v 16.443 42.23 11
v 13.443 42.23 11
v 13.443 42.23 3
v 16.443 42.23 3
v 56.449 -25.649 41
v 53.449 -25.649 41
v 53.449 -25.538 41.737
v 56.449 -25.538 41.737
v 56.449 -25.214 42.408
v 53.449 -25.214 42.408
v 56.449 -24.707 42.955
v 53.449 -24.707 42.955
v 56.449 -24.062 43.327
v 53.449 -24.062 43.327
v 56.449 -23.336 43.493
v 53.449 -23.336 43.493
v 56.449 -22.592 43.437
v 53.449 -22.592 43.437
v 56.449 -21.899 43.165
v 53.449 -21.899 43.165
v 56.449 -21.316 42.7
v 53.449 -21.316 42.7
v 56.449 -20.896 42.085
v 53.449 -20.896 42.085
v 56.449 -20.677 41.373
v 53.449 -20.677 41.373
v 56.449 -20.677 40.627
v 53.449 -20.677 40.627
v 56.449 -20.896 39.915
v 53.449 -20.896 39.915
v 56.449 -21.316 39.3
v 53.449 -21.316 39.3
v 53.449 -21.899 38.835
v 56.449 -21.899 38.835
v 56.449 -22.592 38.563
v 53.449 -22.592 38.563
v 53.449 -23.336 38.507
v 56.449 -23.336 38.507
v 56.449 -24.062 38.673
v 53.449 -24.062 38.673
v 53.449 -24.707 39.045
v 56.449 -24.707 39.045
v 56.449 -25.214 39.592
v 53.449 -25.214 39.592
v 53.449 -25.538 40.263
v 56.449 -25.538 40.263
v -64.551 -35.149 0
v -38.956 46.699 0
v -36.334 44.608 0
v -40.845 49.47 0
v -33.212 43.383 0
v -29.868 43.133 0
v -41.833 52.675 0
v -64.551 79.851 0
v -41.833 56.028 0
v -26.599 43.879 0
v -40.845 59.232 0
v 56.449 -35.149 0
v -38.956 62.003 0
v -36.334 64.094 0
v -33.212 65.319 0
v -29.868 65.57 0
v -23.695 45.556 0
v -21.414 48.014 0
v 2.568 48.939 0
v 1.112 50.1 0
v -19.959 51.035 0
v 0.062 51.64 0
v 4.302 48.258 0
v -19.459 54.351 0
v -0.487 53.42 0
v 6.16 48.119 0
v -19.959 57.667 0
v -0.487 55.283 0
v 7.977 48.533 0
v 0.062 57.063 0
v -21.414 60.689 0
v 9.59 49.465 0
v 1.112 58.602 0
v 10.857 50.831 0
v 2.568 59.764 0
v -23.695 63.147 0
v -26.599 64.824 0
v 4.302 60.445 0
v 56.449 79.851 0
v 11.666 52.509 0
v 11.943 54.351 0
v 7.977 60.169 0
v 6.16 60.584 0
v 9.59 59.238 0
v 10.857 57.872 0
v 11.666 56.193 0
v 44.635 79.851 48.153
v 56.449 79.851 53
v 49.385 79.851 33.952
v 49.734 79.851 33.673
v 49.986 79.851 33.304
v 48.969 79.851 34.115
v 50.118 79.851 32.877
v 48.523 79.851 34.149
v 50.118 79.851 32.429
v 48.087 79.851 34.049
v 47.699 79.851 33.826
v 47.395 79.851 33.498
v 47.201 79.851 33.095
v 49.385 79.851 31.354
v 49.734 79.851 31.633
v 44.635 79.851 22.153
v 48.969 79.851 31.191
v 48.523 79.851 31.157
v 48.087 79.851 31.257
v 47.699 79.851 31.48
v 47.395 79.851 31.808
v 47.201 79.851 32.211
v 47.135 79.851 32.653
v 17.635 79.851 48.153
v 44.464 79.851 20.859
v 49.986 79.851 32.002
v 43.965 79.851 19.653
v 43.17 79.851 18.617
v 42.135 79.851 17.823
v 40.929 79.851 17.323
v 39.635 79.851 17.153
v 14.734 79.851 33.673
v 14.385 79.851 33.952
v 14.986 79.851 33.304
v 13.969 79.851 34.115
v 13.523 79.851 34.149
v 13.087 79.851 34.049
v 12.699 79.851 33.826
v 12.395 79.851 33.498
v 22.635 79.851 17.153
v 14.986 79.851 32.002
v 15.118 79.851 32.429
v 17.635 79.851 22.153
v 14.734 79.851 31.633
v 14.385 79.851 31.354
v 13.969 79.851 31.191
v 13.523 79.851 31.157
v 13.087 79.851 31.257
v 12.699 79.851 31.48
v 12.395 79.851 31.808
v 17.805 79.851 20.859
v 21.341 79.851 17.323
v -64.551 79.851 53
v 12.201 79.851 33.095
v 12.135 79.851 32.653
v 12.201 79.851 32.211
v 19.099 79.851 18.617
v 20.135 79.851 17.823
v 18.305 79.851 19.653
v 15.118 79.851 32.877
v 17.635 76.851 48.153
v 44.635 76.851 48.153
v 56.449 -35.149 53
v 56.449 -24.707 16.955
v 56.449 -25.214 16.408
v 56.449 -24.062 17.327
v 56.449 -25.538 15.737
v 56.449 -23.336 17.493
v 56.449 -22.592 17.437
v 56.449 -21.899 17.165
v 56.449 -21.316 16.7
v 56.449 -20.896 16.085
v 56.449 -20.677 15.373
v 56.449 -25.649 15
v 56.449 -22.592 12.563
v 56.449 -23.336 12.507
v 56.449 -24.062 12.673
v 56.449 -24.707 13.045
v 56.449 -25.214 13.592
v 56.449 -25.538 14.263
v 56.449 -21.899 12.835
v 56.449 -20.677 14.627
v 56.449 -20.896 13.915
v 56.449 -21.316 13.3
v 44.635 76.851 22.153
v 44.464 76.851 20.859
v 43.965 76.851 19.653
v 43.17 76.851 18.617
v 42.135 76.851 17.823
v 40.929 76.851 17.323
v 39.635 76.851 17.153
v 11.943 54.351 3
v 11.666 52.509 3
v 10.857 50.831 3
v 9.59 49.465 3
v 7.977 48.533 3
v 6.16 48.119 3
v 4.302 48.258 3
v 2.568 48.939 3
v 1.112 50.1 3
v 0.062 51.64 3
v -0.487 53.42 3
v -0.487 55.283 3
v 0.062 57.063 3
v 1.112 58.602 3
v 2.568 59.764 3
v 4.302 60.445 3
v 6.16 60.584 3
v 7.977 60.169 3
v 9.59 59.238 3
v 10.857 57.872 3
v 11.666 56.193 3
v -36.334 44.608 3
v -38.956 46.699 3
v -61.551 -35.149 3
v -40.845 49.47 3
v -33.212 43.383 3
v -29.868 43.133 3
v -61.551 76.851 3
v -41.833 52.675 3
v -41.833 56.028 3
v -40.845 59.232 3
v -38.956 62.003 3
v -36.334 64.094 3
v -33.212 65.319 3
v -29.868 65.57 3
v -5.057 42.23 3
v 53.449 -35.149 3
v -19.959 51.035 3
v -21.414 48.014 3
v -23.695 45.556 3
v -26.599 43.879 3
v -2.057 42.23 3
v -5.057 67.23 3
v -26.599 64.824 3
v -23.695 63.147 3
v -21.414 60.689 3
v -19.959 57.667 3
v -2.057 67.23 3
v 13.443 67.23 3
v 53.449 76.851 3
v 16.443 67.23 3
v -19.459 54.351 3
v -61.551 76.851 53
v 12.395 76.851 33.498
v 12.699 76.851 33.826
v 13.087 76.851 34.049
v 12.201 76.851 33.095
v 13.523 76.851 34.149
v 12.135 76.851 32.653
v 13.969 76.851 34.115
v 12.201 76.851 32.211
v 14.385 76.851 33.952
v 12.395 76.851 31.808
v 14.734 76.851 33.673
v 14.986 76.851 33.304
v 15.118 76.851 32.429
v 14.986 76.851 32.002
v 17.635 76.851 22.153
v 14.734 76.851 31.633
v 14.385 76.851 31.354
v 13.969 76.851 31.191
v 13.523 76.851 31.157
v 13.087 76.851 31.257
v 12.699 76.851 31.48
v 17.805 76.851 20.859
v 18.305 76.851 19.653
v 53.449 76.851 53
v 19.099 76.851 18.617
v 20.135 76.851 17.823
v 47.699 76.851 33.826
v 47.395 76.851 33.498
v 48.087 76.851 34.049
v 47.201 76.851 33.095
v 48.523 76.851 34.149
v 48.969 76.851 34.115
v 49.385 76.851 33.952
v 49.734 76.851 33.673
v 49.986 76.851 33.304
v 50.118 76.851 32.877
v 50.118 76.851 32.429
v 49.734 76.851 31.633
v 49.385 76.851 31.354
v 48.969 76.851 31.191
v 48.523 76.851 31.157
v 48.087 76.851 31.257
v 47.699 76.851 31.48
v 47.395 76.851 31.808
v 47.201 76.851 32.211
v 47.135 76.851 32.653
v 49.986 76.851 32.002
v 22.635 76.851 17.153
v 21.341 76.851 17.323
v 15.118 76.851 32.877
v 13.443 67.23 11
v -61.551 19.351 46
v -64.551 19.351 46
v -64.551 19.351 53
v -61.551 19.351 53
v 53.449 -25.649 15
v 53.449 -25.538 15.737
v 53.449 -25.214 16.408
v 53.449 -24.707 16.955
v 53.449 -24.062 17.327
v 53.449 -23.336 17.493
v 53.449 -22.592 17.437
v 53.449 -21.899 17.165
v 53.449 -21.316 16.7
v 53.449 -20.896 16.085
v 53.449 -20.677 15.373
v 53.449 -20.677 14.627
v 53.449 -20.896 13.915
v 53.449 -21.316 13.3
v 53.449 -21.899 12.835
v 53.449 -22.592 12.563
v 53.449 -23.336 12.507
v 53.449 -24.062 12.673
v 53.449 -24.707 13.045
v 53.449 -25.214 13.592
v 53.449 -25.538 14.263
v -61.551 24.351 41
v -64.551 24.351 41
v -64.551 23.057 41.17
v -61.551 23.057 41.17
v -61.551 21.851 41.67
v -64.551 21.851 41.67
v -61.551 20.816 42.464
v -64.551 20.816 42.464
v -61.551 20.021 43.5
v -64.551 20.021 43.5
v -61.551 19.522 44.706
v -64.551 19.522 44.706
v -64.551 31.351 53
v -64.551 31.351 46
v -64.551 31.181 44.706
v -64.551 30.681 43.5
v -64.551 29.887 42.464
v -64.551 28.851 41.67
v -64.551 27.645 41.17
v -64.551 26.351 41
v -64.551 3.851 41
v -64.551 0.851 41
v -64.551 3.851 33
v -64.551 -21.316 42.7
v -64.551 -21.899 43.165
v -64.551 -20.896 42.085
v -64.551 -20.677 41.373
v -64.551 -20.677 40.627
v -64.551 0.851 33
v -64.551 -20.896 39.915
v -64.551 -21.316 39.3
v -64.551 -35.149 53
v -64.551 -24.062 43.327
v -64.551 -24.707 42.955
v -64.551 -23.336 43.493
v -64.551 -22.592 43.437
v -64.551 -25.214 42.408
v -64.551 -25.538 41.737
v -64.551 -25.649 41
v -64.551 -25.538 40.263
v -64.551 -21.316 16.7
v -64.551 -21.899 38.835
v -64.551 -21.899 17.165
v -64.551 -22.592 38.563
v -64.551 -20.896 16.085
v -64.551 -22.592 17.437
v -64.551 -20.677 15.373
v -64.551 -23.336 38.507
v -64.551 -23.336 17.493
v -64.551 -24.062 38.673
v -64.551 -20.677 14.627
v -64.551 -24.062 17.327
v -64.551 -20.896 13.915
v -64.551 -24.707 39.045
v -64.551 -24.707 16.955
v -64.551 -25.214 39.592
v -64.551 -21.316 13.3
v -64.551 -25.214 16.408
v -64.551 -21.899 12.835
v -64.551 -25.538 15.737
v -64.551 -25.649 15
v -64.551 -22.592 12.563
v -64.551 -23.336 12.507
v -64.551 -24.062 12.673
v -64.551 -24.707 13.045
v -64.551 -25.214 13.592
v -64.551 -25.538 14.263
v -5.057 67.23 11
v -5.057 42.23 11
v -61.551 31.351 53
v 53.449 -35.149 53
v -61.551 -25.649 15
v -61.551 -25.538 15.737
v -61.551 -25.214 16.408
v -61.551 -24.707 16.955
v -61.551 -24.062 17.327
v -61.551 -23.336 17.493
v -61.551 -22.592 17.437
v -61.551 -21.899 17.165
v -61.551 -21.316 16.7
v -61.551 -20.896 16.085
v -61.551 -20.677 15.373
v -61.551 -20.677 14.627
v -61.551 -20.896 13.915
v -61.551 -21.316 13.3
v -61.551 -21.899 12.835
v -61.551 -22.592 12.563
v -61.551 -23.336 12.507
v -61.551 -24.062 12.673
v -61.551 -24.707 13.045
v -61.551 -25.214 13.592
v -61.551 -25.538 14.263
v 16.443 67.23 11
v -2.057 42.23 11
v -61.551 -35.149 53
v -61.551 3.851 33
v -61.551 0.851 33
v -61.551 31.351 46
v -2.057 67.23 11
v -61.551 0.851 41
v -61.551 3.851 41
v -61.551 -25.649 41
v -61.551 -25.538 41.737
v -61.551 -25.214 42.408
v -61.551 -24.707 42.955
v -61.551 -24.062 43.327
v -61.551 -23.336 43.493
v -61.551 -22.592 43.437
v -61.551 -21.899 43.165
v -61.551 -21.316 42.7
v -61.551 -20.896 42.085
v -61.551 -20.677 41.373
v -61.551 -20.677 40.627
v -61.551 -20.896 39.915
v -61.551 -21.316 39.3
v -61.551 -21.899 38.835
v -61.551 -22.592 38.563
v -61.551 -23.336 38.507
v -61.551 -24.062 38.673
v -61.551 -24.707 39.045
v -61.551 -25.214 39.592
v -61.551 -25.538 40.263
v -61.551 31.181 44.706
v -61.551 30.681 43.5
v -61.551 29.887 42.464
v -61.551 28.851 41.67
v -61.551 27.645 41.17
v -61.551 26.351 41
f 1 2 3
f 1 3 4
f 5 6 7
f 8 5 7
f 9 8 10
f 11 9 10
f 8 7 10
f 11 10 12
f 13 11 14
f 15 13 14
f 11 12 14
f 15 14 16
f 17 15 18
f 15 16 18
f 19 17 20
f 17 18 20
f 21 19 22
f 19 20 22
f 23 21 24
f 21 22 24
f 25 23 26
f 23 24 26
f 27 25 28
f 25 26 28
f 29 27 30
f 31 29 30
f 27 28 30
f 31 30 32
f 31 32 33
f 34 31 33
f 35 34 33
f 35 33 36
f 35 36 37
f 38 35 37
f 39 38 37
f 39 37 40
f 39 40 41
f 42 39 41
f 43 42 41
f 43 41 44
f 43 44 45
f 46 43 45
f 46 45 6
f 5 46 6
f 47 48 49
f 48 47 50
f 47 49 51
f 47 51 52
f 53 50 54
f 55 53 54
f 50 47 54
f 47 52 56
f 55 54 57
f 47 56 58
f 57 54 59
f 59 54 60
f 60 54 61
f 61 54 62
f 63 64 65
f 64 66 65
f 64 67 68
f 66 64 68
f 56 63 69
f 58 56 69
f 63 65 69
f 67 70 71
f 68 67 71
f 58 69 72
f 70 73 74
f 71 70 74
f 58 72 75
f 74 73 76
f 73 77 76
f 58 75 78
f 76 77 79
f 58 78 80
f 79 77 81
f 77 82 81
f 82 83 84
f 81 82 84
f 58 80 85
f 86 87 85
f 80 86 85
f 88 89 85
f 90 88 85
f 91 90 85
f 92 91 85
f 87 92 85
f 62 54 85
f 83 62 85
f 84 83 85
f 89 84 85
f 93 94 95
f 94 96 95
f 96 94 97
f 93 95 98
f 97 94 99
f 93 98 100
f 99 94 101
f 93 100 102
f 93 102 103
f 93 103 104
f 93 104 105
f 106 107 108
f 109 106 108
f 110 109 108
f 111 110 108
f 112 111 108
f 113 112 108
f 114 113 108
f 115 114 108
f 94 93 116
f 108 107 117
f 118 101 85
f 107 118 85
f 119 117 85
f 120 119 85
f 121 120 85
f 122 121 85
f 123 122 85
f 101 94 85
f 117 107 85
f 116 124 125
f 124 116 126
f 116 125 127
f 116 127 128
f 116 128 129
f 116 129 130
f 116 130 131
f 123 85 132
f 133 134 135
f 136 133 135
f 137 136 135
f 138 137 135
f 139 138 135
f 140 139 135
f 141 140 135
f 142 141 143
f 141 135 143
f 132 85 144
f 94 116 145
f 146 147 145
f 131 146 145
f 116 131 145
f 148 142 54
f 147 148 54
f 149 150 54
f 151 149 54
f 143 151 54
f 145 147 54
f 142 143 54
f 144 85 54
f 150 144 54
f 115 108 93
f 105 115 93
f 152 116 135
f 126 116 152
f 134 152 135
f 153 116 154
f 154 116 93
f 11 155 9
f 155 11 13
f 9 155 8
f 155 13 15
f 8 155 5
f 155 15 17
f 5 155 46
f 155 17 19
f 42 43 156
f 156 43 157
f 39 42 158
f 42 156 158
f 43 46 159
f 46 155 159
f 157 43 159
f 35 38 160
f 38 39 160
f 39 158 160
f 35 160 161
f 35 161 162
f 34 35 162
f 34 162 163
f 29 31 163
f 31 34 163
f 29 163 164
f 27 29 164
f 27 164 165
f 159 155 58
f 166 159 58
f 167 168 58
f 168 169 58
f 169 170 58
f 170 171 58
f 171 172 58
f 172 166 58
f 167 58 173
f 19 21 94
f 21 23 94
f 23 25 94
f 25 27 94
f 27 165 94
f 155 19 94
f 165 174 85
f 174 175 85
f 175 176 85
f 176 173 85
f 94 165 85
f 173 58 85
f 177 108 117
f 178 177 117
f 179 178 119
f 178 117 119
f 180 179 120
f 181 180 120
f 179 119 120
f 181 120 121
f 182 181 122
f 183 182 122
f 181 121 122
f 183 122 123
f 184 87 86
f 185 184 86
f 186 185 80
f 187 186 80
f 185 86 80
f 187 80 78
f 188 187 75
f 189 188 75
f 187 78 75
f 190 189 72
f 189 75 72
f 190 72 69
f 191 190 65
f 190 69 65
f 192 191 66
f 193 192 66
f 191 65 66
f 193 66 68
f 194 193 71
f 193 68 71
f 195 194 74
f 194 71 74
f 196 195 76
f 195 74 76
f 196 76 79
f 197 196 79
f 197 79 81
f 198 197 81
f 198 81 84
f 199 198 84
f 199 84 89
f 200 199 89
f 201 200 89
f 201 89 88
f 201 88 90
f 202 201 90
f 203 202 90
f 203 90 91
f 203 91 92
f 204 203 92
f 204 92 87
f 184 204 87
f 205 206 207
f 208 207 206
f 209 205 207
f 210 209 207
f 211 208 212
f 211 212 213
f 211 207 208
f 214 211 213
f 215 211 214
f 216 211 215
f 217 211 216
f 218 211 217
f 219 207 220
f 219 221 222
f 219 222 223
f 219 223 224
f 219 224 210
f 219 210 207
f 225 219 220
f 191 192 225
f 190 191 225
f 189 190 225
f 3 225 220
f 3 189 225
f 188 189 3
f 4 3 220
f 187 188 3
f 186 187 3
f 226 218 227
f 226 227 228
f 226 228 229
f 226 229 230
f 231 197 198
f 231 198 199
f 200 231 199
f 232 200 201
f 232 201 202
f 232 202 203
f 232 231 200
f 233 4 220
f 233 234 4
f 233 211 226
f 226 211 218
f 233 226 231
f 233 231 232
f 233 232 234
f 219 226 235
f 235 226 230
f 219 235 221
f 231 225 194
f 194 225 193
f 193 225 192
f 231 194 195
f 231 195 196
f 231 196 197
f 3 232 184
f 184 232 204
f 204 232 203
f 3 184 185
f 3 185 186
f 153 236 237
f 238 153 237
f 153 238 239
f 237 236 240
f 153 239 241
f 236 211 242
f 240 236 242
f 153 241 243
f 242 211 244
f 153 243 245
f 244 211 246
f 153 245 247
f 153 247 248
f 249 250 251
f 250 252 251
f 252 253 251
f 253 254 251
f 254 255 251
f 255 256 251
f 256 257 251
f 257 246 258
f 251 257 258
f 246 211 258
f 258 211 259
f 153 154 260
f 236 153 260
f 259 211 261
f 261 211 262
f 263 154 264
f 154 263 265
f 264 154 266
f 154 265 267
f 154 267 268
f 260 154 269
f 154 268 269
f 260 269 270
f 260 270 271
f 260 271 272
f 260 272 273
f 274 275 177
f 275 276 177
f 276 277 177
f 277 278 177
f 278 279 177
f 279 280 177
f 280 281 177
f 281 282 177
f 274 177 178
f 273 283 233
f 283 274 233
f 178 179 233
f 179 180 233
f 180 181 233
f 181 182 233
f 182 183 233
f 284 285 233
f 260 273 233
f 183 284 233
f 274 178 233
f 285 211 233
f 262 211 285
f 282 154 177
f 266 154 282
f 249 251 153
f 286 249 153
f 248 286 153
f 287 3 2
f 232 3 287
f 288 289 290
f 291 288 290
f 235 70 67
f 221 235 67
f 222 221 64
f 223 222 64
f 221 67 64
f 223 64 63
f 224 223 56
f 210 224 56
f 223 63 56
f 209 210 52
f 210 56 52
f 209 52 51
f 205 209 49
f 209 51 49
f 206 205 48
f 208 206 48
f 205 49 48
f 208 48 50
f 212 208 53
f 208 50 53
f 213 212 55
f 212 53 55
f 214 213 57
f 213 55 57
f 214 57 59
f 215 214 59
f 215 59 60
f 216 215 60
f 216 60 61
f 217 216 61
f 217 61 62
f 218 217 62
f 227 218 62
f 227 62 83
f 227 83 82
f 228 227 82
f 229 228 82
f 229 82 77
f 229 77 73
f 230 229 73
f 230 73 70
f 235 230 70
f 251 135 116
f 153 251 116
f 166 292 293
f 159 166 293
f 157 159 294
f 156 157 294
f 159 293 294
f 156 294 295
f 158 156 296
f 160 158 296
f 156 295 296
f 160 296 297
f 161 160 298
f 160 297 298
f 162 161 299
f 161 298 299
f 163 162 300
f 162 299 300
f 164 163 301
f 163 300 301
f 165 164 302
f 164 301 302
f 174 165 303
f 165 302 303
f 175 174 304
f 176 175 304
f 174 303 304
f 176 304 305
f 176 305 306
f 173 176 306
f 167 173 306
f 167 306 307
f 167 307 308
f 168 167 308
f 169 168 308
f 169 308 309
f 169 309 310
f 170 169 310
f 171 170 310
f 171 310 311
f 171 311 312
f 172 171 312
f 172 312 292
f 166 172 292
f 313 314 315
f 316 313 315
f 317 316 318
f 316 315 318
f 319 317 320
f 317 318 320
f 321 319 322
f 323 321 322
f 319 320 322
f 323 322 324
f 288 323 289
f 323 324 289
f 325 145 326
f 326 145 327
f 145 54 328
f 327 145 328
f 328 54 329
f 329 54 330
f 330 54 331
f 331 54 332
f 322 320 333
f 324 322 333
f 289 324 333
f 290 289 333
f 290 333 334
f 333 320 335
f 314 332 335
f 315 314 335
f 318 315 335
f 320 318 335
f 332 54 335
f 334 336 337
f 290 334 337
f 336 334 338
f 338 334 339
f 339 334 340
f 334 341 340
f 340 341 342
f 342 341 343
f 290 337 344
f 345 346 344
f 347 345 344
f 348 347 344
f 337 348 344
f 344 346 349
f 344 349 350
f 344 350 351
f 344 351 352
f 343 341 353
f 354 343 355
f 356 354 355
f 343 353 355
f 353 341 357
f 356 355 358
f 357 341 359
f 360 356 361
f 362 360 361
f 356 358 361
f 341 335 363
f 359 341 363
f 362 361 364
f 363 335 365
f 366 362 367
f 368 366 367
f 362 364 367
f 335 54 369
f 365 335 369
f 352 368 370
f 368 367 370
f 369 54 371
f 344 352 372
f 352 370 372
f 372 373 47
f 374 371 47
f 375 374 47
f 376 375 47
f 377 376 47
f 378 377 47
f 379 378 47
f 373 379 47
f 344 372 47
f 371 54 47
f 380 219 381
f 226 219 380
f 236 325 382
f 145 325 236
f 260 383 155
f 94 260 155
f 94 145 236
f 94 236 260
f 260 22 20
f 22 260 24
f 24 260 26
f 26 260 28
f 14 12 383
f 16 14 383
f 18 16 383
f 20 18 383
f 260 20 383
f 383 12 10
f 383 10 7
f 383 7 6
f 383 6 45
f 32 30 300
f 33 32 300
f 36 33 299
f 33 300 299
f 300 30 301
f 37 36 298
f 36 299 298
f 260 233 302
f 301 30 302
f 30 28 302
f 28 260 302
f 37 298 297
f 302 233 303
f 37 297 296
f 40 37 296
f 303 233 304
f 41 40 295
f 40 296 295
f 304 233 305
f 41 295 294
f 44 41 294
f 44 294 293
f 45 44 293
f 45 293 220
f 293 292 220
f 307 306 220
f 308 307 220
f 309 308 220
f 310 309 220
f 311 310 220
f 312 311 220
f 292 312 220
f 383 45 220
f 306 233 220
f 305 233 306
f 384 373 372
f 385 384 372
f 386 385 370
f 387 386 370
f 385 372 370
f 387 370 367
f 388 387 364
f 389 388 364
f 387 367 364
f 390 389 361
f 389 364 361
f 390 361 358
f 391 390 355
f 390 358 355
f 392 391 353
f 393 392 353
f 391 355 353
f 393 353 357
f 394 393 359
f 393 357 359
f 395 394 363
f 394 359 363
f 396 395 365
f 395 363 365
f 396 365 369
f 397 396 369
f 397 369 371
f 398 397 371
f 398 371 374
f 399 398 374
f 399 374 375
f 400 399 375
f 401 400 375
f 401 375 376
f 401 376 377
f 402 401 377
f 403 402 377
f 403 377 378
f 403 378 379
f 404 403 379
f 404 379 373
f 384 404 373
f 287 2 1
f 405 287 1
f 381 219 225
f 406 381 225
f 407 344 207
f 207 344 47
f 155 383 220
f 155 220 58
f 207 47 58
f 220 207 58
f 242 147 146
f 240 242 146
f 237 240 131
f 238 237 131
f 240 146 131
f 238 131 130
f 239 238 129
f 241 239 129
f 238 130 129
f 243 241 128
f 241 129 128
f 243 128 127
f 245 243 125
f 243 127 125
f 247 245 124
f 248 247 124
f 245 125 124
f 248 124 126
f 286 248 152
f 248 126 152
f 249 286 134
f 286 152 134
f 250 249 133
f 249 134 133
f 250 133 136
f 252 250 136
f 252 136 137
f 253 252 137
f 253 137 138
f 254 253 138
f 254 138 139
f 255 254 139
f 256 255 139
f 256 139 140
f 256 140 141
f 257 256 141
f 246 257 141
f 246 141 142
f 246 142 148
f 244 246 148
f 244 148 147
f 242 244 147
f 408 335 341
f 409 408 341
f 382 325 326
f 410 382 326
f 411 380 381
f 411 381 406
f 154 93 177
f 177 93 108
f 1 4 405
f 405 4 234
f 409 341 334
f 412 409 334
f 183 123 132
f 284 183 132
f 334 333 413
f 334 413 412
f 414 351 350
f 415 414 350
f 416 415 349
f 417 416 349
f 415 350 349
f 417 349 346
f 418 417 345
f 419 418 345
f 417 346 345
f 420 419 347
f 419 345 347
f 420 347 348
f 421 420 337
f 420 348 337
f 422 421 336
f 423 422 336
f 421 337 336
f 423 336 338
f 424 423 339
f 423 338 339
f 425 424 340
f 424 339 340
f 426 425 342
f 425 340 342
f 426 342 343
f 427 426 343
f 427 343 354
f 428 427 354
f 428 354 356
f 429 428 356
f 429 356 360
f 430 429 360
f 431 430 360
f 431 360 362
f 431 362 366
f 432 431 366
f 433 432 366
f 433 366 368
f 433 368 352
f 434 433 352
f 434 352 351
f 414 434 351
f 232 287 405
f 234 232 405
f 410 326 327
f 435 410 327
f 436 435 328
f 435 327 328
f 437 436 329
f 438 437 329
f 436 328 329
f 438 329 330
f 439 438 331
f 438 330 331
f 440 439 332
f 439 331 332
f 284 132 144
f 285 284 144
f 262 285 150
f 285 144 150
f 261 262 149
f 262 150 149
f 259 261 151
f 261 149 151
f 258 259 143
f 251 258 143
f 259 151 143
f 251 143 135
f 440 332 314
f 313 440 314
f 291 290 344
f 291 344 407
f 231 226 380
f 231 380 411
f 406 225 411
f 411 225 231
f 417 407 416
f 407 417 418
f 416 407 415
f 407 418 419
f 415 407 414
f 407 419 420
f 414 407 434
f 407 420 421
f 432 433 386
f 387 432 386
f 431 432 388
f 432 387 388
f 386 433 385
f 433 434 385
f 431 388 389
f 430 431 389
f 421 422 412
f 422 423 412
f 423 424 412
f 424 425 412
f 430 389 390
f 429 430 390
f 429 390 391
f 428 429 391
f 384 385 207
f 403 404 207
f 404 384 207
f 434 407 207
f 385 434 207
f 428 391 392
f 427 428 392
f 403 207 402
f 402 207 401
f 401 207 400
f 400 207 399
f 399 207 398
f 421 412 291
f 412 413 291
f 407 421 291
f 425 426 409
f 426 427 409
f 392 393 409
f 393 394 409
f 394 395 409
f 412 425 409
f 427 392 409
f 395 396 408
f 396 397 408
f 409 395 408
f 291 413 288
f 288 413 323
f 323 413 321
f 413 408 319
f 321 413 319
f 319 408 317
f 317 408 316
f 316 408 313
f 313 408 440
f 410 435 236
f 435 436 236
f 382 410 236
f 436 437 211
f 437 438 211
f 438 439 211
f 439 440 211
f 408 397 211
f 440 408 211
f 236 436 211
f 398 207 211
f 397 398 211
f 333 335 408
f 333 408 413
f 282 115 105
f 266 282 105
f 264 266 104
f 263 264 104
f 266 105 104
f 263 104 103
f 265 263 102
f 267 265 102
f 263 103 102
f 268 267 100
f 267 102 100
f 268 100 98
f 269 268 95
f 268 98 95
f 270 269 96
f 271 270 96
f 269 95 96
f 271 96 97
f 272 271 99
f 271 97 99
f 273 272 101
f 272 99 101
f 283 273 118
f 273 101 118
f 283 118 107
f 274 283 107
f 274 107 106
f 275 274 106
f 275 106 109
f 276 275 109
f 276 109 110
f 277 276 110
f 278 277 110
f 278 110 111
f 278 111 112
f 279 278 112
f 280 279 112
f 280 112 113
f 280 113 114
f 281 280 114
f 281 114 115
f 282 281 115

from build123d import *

# Parameters (mm, degrees)
F0_W      = 121
F0_H      = 115
F1_DEPTH  = 3
F3_DEPTH  = 50
F4_R      = 2.5
F5_DEPTH  = 121.001
F6_R      = 11.25
F6_R_2    = 6.25
F7_DEPTH  = 25
F8_W      = 3
F8_H      = 25
F9_DEPTH  = 8
F10_R     = 1.5
F11_DEPTH = 25
F13_DEPTH = 25
F14_R     = 2.5
F14_W     = 3
F14_H     = 8
F15_DEPTH = 25


with BuildPart() as f1:
    # F0 (on Top) → F1 (new body)
    with BuildSketch(Plane.XY):
        with Locations((-4.051243, 22.351279)):
            Rectangle(F0_W, F0_H)
    extrude(amount=F1_DEPTH)

    # F2 (on face) → F3 (join)
    with BuildSketch(Plane.XY.offset(3)):
        Polygon((56.448757, 79.851279), (-64.551243, 79.851279), (-64.551243, -35.148721), (-61.551243, -35.148721), (-61.551243, 76.851279), (53.448757, 76.851279), (53.448757, -35.148721), (56.448757, -35.148721), align=None)
    extrude(amount=F3_DEPTH)

    # F4 (on face) → F5 (cut, through all)
    with BuildSketch(Plane(origin=(-64.551243, 0, 0), x_dir=(0, -1, 0), z_dir=(-1, 0, 0))):
        with Locations((23.148721, 15)):
            Circle(F4_R)
        with Locations((23.148721, 41)):
            Circle(F4_R)
    extrude(amount=-F5_DEPTH, mode=Mode.SUBTRACT)

    # F6 (on face) → F7 (cut)
    with BuildSketch(Plane(origin=(0, 0, 0), x_dir=(1, 0, 0), z_dir=(0, 0, -1))):
        with Locations((-30.708815, -54.351279)):
            Circle(F6_R)
        with Locations((5.693216, -54.351279)):
            Circle(F6_R_2)
    extrude(amount=-F7_DEPTH, mode=Mode.SUBTRACT)

    # F8 (on face) → F9 (join)
    with BuildSketch(Plane.XY.offset(3)):
        with Locations((-3.556784, 54.730202)):
            Rectangle(F8_W, F8_H)
        with Locations((14.943216, 54.730202)):
            Rectangle(F8_W, F8_H)
    extrude(amount=F9_DEPTH)

    # F10 (on face) → F11 (cut)
    with BuildSketch(Plane(origin=(0, 79.851279, 0), x_dir=(-1, 0, 0), z_dir=(0, 1, 0))):
        with BuildLine():
            ThreePointArc((-44.634731, 22.153023), (-43.170264, 18.617489), (-39.634731, 17.153023))
            Line((-39.634731, 17.153023), (-22.634731, 17.153023))
            ThreePointArc((-22.634731, 17.153023), (-19.099197, 18.617489), (-17.634731, 22.153023))
            Line((-17.634731, 22.153023), (-17.634731, 48.153023))
            Line((-17.634731, 48.153023), (-44.634731, 48.153023))
            Line((-44.634731, 48.153023), (-44.634731, 22.153023))
        make_face()
        with Locations((-13.634731, 32.653023)):
            Circle(F10_R)
        with Locations((-48.634731, 32.653023)):
            Circle(F10_R)
    extrude(amount=-F11_DEPTH, mode=Mode.SUBTRACT)

    # F12 (on face) → F13 (cut)
    with BuildSketch(Plane(origin=(-64.551243, 0, 0), x_dir=(0, -1, 0), z_dir=(-1, 0, 0))):
        with BuildLine():
            Line((-19.351279, 62.000753), (-31.351279, 62.000753))
            Line((-31.351279, 62.000753), (-31.351279, 46))
            ThreePointArc((-31.351279, 46), (-29.886813, 42.464466), (-26.351279, 41))
            Line((-26.351279, 41), (-24.351279, 41))
            ThreePointArc((-24.351279, 41), (-20.815745, 42.464466), (-19.351279, 46))
            Line((-19.351279, 46), (-19.351279, 62.000753))
        make_face()
    extrude(amount=-F13_DEPTH, mode=Mode.SUBTRACT)

    # F14 (on face) → F15 (cut)
    with BuildSketch(Plane(origin=(-64.551243, 0, 0), x_dir=(0, -1, 0), z_dir=(-1, 0, 0))):
        with Locations((23.148721, 41)):
            Circle(F14_R)
        with Locations((-2.351279, 37)):
            Rectangle(F14_W, F14_H)
    extrude(amount=-F15_DEPTH, mode=Mode.SUBTRACT)


solid = f1.part
